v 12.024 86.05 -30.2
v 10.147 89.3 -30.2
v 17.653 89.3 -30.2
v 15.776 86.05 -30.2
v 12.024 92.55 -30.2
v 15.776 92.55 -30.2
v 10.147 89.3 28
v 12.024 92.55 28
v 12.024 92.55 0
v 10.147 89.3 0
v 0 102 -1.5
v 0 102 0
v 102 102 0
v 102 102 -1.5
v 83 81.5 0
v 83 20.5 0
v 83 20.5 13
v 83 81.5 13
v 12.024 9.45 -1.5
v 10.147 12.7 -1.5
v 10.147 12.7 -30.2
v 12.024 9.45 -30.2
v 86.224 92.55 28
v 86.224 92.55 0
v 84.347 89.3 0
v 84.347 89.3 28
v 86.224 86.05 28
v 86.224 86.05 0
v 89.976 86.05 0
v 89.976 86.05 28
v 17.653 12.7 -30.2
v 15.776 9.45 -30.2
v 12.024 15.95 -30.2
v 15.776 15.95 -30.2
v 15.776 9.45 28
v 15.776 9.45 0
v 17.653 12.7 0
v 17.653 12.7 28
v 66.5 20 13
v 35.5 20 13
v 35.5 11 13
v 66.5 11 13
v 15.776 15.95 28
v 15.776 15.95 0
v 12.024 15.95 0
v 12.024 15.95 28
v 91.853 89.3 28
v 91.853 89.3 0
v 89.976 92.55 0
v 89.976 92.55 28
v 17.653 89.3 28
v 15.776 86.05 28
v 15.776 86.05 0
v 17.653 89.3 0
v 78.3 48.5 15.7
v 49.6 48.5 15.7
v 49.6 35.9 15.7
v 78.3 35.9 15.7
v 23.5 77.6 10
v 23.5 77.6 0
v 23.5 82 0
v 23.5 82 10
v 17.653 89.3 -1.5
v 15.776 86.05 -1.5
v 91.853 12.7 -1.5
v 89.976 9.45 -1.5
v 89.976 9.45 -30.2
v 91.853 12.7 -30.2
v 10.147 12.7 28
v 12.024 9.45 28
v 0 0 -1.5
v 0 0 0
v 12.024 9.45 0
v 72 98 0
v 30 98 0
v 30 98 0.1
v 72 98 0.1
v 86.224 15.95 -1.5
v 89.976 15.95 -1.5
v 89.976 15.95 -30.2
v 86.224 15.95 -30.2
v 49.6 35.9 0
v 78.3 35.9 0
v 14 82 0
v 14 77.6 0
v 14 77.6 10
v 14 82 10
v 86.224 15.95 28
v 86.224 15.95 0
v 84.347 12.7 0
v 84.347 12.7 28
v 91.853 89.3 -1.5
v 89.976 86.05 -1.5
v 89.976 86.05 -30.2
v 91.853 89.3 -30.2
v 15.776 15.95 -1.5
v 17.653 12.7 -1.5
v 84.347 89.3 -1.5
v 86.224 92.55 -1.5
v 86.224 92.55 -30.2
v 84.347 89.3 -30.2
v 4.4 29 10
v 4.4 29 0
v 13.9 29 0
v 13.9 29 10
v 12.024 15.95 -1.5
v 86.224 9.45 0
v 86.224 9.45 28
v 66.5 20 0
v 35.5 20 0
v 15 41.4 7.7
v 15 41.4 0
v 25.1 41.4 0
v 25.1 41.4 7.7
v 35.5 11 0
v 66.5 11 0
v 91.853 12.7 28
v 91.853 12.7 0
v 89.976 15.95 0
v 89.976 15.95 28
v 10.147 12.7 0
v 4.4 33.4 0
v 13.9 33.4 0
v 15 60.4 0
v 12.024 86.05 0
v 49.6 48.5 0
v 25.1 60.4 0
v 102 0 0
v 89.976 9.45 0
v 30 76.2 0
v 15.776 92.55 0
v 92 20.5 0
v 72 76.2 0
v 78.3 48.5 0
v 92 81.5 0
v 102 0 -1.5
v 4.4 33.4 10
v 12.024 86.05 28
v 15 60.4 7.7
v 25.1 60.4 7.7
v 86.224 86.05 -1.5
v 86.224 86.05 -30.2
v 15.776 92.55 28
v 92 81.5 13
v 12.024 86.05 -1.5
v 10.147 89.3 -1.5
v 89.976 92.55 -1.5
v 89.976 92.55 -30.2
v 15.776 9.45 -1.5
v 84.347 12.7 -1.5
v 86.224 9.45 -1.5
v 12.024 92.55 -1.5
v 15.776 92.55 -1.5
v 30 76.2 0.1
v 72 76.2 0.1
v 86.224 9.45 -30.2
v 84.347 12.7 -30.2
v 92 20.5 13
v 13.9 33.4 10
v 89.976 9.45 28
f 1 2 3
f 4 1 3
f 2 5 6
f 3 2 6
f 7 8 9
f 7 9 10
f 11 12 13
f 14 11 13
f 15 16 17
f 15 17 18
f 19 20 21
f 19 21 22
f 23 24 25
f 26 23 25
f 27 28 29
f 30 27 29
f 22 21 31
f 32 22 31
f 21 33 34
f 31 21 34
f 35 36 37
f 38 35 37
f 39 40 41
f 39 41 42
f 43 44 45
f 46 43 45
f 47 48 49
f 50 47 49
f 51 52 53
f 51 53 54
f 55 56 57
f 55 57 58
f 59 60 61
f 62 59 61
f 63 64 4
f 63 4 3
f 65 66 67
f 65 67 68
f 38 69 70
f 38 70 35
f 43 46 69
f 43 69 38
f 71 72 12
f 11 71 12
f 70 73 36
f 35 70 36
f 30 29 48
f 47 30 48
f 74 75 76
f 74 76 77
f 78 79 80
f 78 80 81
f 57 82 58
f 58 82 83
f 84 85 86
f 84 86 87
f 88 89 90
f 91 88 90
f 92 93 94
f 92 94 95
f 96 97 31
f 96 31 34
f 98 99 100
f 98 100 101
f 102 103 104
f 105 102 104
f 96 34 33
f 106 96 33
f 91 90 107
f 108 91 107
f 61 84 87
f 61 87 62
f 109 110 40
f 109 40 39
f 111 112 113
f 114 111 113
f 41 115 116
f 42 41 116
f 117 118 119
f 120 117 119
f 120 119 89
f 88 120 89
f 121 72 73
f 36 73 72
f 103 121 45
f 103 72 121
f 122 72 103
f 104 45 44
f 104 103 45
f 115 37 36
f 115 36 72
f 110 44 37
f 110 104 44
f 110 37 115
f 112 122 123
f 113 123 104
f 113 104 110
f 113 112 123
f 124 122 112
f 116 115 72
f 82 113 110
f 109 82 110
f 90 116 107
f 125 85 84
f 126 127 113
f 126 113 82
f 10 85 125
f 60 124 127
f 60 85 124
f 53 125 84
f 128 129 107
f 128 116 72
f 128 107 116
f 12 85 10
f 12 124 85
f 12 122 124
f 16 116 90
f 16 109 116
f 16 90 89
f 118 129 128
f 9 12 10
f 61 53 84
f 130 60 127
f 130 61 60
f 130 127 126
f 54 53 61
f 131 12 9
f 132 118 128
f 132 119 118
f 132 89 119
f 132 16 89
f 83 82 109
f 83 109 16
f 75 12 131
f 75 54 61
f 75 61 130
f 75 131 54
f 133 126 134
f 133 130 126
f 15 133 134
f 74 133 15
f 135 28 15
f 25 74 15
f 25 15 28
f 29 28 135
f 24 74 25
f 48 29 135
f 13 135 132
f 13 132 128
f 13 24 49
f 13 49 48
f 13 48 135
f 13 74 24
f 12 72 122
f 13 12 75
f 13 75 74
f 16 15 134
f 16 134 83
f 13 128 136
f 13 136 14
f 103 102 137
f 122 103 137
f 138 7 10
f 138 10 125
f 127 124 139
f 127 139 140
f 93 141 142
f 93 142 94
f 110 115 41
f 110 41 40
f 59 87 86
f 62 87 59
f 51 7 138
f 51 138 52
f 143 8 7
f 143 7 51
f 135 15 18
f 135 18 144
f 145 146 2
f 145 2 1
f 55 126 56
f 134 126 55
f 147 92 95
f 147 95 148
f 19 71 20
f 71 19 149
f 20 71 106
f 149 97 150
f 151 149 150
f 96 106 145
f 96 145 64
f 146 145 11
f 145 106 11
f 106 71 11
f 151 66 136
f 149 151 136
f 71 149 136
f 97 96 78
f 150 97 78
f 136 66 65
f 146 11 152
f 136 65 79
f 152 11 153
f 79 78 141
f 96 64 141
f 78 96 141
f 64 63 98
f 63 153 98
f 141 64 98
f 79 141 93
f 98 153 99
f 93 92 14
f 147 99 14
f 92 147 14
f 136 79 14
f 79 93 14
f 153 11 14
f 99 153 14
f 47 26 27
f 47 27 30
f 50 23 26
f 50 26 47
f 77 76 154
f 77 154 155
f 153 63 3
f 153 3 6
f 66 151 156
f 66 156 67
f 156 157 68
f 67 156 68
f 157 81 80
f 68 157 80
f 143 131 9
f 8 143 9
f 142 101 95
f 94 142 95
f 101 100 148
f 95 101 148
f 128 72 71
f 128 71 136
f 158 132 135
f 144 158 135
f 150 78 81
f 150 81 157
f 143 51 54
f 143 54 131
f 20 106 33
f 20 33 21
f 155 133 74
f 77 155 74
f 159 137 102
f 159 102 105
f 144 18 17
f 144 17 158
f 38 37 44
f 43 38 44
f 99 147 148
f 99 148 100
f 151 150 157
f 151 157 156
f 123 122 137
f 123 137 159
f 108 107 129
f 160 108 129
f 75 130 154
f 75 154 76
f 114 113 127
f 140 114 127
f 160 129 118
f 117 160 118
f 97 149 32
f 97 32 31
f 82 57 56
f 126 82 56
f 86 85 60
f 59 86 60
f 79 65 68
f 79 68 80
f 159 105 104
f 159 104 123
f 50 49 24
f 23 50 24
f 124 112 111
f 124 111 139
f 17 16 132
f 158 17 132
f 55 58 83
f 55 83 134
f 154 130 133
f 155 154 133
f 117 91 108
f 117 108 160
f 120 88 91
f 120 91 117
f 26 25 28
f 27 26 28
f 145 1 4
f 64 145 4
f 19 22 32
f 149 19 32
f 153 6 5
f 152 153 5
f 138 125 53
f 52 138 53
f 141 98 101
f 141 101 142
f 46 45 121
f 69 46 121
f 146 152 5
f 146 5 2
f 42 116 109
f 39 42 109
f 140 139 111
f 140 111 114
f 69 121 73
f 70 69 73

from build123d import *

# Parameters (mm, degrees)
F0_W     = 102
F0_H     = 102
F0_W_2   = 9.5
F0_H_2   = 4.4
F0_W_3   = 10.1
F0_H_3   = 19
F0_W_4   = 31
F0_H_4   = 9
F0_W_5   = 28.7
F0_H_5   = 12.6
F0_W_6   = 9
F0_H_6   = 61
F0_W_7   = 42
F0_H_7   = 21.8
F1_DEPTH = 1.5
F2_DEPTH = 30.2
F3_DEPTH = 28
F4_DEPTH = 0.1
F5_DEPTH = 13
F6_DEPTH = 10
F7_DEPTH = 7.7
F8_DEPTH = 15.7


with BuildPart() as f1:
    # F0 (on Top) → F1 (new body)
    with BuildSketch(Plane.XY):
        with Locations((51, 51)):
            Rectangle(F0_W, F0_H)
        Polygon((10.1472232503, 12.7), (12.0236116251, 15.95), (15.7763883749, 15.95), (17.6527767497, 12.7), (15.7763883749, 9.45), (12.0236116251, 9.45), align=None, mode=Mode.SUBTRACT)
        with Locations((9.15, 31.2)):
            Rectangle(F0_W_2, F0_H_2, mode=Mode.SUBTRACT)
        with Locations((20.05, 50.9)):
            Rectangle(F0_W_3, F0_H_3, mode=Mode.SUBTRACT)
        with Locations((51, 15.5)):
            Rectangle(F0_W_4, F0_H_4, mode=Mode.SUBTRACT)
        Polygon((86.2236116251, 15.95), (89.9763883749, 15.95), (91.8527767497, 12.7), (89.9763883749, 9.45), (86.2236116251, 9.45), (84.3472232503, 12.7), align=None, mode=Mode.SUBTRACT)
        with Locations((63.95, 42.2)):
            Rectangle(F0_W_5, F0_H_5, mode=Mode.SUBTRACT)
        with Locations((18.75, 79.8)):
            Rectangle(F0_W_2, F0_H_2, mode=Mode.SUBTRACT)
        Polygon((15.7763883749, 92.55), (17.6527767497, 89.3), (15.7763883749, 86.05), (12.0236116251, 86.05), (10.1472232503, 89.3), (12.0236116251, 92.55), align=None, mode=Mode.SUBTRACT)
        with Locations((87.5, 51)):
            Rectangle(F0_W_6, F0_H_6, mode=Mode.SUBTRACT)
        with Locations((51, 87.1)):
            Rectangle(F0_W_7, F0_H_7, mode=Mode.SUBTRACT)
        Polygon((89.9763883749, 92.55), (91.8527767497, 89.3), (89.9763883749, 86.05), (86.2236116251, 86.05), (84.3472232503, 89.3), (86.2236116251, 92.55), align=None, mode=Mode.SUBTRACT)
        with Locations((51, 87.1)):
            Rectangle(F0_W_7, F0_H_7)
        with Locations((87.5, 51)):
            Rectangle(F0_W_6, F0_H_6)
        with Locations((63.95, 42.2)):
            Rectangle(F0_W_5, F0_H_5)
        with Locations((51, 15.5)):
            Rectangle(F0_W_4, F0_H_4)
        with Locations((20.05, 50.9)):
            Rectangle(F0_W_3, F0_H_3)
        with Locations((9.15, 31.2)):
            Rectangle(F0_W_2, F0_H_2)
        with Locations((18.75, 79.8)):
            Rectangle(F0_W_2, F0_H_2)
        Polygon((91.8527767497, 12.7), (89.9763883749, 15.95), (86.2236116251, 15.95), (84.3472232503, 12.7), (86.2236116251, 9.45), (89.9763883749, 9.45), align=None)
        Polygon((15.7763883749, 15.95), (12.0236116251, 15.95), (10.1472232503, 12.7), (12.0236116251, 9.45), (15.7763883749, 9.45), (17.6527767497, 12.7), align=None)
        Polygon((15.7763883749, 86.05), (17.6527767497, 89.3), (15.7763883749, 92.55), (12.0236116251, 92.55), (10.1472232503, 89.3), (12.0236116251, 86.05), align=None)
        Polygon((89.9763883749, 86.05), (91.8527767497, 89.3), (89.9763883749, 92.55), (86.2236116251, 92.55), (84.3472232503, 89.3), (86.2236116251, 86.05), align=None)
    extrude(amount=-F1_DEPTH)

    # F0 (on Top) → F2 (join)
    with BuildSketch(Plane.XY):
        Polygon((15.7763883749, 15.95), (12.0236116251, 15.95), (10.1472232503, 12.7), (12.0236116251, 9.45), (15.7763883749, 9.45), (17.6527767497, 12.7), align=None)
        Polygon((15.7763883749, 86.05), (17.6527767497, 89.3), (15.7763883749, 92.55), (12.0236116251, 92.55), (10.1472232503, 89.3), (12.0236116251, 86.05), align=None)
        Polygon((89.9763883749, 86.05), (91.8527767497, 89.3), (89.9763883749, 92.55), (86.2236116251, 92.55), (84.3472232503, 89.3), (86.2236116251, 86.05), align=None)
        Polygon((91.8527767497, 12.7), (89.9763883749, 15.95), (86.2236116251, 15.95), (84.3472232503, 12.7), (86.2236116251, 9.45), (89.9763883749, 9.45), align=None)
    extrude(amount=-F2_DEPTH)

    # F0 (on Top) → F3 (join)
    with BuildSketch(Plane.XY):
        Polygon((15.7763883749, 86.05), (17.6527767497, 89.3), (15.7763883749, 92.55), (12.0236116251, 92.55), (10.1472232503, 89.3), (12.0236116251, 86.05), align=None)
        Polygon((89.9763883749, 86.05), (91.8527767497, 89.3), (89.9763883749, 92.55), (86.2236116251, 92.55), (84.3472232503, 89.3), (86.2236116251, 86.05), align=None)
        Polygon((91.8527767497, 12.7), (89.9763883749, 15.95), (86.2236116251, 15.95), (84.3472232503, 12.7), (86.2236116251, 9.45), (89.9763883749, 9.45), align=None)
        Polygon((15.7763883749, 15.95), (12.0236116251, 15.95), (10.1472232503, 12.7), (12.0236116251, 9.45), (15.7763883749, 9.45), (17.6527767497, 12.7), align=None)
    extrude(amount=F3_DEPTH)

    # F0 (on Top) → F4 (join)
    with BuildSketch(Plane.XY):
        with Locations((51, 87.1)):
            Rectangle(F0_W_7, F0_H_7)
    extrude(amount=F4_DEPTH)

    # F0 (on Top) → F5 (join)
    with BuildSketch(Plane.XY):
        with Locations((51, 15.5)):
            Rectangle(F0_W_4, F0_H_4)
        with Locations((87.5, 51)):
            Rectangle(F0_W_6, F0_H_6)
    extrude(amount=F5_DEPTH)

    # F0 (on Top) → F6 (join)
    with BuildSketch(Plane.XY):
        with Locations((9.15, 31.2)):
            Rectangle(F0_W_2, F0_H_2)
        with Locations((18.75, 79.8)):
            Rectangle(F0_W_2, F0_H_2)
    extrude(amount=F6_DEPTH)

    # F0 (on Top) → F7 (join)
    with BuildSketch(Plane.XY):
        with Locations((20.05, 50.9)):
            Rectangle(F0_W_3, F0_H_3)
    extrude(amount=F7_DEPTH)

    # F0 (on Top) → F8 (join)
    with BuildSketch(Plane.XY):
        with Locations((63.95, 42.2)):
            Rectangle(F0_W_5, F0_H_5)
    extrude(amount=F8_DEPTH)


solid = f1.part
